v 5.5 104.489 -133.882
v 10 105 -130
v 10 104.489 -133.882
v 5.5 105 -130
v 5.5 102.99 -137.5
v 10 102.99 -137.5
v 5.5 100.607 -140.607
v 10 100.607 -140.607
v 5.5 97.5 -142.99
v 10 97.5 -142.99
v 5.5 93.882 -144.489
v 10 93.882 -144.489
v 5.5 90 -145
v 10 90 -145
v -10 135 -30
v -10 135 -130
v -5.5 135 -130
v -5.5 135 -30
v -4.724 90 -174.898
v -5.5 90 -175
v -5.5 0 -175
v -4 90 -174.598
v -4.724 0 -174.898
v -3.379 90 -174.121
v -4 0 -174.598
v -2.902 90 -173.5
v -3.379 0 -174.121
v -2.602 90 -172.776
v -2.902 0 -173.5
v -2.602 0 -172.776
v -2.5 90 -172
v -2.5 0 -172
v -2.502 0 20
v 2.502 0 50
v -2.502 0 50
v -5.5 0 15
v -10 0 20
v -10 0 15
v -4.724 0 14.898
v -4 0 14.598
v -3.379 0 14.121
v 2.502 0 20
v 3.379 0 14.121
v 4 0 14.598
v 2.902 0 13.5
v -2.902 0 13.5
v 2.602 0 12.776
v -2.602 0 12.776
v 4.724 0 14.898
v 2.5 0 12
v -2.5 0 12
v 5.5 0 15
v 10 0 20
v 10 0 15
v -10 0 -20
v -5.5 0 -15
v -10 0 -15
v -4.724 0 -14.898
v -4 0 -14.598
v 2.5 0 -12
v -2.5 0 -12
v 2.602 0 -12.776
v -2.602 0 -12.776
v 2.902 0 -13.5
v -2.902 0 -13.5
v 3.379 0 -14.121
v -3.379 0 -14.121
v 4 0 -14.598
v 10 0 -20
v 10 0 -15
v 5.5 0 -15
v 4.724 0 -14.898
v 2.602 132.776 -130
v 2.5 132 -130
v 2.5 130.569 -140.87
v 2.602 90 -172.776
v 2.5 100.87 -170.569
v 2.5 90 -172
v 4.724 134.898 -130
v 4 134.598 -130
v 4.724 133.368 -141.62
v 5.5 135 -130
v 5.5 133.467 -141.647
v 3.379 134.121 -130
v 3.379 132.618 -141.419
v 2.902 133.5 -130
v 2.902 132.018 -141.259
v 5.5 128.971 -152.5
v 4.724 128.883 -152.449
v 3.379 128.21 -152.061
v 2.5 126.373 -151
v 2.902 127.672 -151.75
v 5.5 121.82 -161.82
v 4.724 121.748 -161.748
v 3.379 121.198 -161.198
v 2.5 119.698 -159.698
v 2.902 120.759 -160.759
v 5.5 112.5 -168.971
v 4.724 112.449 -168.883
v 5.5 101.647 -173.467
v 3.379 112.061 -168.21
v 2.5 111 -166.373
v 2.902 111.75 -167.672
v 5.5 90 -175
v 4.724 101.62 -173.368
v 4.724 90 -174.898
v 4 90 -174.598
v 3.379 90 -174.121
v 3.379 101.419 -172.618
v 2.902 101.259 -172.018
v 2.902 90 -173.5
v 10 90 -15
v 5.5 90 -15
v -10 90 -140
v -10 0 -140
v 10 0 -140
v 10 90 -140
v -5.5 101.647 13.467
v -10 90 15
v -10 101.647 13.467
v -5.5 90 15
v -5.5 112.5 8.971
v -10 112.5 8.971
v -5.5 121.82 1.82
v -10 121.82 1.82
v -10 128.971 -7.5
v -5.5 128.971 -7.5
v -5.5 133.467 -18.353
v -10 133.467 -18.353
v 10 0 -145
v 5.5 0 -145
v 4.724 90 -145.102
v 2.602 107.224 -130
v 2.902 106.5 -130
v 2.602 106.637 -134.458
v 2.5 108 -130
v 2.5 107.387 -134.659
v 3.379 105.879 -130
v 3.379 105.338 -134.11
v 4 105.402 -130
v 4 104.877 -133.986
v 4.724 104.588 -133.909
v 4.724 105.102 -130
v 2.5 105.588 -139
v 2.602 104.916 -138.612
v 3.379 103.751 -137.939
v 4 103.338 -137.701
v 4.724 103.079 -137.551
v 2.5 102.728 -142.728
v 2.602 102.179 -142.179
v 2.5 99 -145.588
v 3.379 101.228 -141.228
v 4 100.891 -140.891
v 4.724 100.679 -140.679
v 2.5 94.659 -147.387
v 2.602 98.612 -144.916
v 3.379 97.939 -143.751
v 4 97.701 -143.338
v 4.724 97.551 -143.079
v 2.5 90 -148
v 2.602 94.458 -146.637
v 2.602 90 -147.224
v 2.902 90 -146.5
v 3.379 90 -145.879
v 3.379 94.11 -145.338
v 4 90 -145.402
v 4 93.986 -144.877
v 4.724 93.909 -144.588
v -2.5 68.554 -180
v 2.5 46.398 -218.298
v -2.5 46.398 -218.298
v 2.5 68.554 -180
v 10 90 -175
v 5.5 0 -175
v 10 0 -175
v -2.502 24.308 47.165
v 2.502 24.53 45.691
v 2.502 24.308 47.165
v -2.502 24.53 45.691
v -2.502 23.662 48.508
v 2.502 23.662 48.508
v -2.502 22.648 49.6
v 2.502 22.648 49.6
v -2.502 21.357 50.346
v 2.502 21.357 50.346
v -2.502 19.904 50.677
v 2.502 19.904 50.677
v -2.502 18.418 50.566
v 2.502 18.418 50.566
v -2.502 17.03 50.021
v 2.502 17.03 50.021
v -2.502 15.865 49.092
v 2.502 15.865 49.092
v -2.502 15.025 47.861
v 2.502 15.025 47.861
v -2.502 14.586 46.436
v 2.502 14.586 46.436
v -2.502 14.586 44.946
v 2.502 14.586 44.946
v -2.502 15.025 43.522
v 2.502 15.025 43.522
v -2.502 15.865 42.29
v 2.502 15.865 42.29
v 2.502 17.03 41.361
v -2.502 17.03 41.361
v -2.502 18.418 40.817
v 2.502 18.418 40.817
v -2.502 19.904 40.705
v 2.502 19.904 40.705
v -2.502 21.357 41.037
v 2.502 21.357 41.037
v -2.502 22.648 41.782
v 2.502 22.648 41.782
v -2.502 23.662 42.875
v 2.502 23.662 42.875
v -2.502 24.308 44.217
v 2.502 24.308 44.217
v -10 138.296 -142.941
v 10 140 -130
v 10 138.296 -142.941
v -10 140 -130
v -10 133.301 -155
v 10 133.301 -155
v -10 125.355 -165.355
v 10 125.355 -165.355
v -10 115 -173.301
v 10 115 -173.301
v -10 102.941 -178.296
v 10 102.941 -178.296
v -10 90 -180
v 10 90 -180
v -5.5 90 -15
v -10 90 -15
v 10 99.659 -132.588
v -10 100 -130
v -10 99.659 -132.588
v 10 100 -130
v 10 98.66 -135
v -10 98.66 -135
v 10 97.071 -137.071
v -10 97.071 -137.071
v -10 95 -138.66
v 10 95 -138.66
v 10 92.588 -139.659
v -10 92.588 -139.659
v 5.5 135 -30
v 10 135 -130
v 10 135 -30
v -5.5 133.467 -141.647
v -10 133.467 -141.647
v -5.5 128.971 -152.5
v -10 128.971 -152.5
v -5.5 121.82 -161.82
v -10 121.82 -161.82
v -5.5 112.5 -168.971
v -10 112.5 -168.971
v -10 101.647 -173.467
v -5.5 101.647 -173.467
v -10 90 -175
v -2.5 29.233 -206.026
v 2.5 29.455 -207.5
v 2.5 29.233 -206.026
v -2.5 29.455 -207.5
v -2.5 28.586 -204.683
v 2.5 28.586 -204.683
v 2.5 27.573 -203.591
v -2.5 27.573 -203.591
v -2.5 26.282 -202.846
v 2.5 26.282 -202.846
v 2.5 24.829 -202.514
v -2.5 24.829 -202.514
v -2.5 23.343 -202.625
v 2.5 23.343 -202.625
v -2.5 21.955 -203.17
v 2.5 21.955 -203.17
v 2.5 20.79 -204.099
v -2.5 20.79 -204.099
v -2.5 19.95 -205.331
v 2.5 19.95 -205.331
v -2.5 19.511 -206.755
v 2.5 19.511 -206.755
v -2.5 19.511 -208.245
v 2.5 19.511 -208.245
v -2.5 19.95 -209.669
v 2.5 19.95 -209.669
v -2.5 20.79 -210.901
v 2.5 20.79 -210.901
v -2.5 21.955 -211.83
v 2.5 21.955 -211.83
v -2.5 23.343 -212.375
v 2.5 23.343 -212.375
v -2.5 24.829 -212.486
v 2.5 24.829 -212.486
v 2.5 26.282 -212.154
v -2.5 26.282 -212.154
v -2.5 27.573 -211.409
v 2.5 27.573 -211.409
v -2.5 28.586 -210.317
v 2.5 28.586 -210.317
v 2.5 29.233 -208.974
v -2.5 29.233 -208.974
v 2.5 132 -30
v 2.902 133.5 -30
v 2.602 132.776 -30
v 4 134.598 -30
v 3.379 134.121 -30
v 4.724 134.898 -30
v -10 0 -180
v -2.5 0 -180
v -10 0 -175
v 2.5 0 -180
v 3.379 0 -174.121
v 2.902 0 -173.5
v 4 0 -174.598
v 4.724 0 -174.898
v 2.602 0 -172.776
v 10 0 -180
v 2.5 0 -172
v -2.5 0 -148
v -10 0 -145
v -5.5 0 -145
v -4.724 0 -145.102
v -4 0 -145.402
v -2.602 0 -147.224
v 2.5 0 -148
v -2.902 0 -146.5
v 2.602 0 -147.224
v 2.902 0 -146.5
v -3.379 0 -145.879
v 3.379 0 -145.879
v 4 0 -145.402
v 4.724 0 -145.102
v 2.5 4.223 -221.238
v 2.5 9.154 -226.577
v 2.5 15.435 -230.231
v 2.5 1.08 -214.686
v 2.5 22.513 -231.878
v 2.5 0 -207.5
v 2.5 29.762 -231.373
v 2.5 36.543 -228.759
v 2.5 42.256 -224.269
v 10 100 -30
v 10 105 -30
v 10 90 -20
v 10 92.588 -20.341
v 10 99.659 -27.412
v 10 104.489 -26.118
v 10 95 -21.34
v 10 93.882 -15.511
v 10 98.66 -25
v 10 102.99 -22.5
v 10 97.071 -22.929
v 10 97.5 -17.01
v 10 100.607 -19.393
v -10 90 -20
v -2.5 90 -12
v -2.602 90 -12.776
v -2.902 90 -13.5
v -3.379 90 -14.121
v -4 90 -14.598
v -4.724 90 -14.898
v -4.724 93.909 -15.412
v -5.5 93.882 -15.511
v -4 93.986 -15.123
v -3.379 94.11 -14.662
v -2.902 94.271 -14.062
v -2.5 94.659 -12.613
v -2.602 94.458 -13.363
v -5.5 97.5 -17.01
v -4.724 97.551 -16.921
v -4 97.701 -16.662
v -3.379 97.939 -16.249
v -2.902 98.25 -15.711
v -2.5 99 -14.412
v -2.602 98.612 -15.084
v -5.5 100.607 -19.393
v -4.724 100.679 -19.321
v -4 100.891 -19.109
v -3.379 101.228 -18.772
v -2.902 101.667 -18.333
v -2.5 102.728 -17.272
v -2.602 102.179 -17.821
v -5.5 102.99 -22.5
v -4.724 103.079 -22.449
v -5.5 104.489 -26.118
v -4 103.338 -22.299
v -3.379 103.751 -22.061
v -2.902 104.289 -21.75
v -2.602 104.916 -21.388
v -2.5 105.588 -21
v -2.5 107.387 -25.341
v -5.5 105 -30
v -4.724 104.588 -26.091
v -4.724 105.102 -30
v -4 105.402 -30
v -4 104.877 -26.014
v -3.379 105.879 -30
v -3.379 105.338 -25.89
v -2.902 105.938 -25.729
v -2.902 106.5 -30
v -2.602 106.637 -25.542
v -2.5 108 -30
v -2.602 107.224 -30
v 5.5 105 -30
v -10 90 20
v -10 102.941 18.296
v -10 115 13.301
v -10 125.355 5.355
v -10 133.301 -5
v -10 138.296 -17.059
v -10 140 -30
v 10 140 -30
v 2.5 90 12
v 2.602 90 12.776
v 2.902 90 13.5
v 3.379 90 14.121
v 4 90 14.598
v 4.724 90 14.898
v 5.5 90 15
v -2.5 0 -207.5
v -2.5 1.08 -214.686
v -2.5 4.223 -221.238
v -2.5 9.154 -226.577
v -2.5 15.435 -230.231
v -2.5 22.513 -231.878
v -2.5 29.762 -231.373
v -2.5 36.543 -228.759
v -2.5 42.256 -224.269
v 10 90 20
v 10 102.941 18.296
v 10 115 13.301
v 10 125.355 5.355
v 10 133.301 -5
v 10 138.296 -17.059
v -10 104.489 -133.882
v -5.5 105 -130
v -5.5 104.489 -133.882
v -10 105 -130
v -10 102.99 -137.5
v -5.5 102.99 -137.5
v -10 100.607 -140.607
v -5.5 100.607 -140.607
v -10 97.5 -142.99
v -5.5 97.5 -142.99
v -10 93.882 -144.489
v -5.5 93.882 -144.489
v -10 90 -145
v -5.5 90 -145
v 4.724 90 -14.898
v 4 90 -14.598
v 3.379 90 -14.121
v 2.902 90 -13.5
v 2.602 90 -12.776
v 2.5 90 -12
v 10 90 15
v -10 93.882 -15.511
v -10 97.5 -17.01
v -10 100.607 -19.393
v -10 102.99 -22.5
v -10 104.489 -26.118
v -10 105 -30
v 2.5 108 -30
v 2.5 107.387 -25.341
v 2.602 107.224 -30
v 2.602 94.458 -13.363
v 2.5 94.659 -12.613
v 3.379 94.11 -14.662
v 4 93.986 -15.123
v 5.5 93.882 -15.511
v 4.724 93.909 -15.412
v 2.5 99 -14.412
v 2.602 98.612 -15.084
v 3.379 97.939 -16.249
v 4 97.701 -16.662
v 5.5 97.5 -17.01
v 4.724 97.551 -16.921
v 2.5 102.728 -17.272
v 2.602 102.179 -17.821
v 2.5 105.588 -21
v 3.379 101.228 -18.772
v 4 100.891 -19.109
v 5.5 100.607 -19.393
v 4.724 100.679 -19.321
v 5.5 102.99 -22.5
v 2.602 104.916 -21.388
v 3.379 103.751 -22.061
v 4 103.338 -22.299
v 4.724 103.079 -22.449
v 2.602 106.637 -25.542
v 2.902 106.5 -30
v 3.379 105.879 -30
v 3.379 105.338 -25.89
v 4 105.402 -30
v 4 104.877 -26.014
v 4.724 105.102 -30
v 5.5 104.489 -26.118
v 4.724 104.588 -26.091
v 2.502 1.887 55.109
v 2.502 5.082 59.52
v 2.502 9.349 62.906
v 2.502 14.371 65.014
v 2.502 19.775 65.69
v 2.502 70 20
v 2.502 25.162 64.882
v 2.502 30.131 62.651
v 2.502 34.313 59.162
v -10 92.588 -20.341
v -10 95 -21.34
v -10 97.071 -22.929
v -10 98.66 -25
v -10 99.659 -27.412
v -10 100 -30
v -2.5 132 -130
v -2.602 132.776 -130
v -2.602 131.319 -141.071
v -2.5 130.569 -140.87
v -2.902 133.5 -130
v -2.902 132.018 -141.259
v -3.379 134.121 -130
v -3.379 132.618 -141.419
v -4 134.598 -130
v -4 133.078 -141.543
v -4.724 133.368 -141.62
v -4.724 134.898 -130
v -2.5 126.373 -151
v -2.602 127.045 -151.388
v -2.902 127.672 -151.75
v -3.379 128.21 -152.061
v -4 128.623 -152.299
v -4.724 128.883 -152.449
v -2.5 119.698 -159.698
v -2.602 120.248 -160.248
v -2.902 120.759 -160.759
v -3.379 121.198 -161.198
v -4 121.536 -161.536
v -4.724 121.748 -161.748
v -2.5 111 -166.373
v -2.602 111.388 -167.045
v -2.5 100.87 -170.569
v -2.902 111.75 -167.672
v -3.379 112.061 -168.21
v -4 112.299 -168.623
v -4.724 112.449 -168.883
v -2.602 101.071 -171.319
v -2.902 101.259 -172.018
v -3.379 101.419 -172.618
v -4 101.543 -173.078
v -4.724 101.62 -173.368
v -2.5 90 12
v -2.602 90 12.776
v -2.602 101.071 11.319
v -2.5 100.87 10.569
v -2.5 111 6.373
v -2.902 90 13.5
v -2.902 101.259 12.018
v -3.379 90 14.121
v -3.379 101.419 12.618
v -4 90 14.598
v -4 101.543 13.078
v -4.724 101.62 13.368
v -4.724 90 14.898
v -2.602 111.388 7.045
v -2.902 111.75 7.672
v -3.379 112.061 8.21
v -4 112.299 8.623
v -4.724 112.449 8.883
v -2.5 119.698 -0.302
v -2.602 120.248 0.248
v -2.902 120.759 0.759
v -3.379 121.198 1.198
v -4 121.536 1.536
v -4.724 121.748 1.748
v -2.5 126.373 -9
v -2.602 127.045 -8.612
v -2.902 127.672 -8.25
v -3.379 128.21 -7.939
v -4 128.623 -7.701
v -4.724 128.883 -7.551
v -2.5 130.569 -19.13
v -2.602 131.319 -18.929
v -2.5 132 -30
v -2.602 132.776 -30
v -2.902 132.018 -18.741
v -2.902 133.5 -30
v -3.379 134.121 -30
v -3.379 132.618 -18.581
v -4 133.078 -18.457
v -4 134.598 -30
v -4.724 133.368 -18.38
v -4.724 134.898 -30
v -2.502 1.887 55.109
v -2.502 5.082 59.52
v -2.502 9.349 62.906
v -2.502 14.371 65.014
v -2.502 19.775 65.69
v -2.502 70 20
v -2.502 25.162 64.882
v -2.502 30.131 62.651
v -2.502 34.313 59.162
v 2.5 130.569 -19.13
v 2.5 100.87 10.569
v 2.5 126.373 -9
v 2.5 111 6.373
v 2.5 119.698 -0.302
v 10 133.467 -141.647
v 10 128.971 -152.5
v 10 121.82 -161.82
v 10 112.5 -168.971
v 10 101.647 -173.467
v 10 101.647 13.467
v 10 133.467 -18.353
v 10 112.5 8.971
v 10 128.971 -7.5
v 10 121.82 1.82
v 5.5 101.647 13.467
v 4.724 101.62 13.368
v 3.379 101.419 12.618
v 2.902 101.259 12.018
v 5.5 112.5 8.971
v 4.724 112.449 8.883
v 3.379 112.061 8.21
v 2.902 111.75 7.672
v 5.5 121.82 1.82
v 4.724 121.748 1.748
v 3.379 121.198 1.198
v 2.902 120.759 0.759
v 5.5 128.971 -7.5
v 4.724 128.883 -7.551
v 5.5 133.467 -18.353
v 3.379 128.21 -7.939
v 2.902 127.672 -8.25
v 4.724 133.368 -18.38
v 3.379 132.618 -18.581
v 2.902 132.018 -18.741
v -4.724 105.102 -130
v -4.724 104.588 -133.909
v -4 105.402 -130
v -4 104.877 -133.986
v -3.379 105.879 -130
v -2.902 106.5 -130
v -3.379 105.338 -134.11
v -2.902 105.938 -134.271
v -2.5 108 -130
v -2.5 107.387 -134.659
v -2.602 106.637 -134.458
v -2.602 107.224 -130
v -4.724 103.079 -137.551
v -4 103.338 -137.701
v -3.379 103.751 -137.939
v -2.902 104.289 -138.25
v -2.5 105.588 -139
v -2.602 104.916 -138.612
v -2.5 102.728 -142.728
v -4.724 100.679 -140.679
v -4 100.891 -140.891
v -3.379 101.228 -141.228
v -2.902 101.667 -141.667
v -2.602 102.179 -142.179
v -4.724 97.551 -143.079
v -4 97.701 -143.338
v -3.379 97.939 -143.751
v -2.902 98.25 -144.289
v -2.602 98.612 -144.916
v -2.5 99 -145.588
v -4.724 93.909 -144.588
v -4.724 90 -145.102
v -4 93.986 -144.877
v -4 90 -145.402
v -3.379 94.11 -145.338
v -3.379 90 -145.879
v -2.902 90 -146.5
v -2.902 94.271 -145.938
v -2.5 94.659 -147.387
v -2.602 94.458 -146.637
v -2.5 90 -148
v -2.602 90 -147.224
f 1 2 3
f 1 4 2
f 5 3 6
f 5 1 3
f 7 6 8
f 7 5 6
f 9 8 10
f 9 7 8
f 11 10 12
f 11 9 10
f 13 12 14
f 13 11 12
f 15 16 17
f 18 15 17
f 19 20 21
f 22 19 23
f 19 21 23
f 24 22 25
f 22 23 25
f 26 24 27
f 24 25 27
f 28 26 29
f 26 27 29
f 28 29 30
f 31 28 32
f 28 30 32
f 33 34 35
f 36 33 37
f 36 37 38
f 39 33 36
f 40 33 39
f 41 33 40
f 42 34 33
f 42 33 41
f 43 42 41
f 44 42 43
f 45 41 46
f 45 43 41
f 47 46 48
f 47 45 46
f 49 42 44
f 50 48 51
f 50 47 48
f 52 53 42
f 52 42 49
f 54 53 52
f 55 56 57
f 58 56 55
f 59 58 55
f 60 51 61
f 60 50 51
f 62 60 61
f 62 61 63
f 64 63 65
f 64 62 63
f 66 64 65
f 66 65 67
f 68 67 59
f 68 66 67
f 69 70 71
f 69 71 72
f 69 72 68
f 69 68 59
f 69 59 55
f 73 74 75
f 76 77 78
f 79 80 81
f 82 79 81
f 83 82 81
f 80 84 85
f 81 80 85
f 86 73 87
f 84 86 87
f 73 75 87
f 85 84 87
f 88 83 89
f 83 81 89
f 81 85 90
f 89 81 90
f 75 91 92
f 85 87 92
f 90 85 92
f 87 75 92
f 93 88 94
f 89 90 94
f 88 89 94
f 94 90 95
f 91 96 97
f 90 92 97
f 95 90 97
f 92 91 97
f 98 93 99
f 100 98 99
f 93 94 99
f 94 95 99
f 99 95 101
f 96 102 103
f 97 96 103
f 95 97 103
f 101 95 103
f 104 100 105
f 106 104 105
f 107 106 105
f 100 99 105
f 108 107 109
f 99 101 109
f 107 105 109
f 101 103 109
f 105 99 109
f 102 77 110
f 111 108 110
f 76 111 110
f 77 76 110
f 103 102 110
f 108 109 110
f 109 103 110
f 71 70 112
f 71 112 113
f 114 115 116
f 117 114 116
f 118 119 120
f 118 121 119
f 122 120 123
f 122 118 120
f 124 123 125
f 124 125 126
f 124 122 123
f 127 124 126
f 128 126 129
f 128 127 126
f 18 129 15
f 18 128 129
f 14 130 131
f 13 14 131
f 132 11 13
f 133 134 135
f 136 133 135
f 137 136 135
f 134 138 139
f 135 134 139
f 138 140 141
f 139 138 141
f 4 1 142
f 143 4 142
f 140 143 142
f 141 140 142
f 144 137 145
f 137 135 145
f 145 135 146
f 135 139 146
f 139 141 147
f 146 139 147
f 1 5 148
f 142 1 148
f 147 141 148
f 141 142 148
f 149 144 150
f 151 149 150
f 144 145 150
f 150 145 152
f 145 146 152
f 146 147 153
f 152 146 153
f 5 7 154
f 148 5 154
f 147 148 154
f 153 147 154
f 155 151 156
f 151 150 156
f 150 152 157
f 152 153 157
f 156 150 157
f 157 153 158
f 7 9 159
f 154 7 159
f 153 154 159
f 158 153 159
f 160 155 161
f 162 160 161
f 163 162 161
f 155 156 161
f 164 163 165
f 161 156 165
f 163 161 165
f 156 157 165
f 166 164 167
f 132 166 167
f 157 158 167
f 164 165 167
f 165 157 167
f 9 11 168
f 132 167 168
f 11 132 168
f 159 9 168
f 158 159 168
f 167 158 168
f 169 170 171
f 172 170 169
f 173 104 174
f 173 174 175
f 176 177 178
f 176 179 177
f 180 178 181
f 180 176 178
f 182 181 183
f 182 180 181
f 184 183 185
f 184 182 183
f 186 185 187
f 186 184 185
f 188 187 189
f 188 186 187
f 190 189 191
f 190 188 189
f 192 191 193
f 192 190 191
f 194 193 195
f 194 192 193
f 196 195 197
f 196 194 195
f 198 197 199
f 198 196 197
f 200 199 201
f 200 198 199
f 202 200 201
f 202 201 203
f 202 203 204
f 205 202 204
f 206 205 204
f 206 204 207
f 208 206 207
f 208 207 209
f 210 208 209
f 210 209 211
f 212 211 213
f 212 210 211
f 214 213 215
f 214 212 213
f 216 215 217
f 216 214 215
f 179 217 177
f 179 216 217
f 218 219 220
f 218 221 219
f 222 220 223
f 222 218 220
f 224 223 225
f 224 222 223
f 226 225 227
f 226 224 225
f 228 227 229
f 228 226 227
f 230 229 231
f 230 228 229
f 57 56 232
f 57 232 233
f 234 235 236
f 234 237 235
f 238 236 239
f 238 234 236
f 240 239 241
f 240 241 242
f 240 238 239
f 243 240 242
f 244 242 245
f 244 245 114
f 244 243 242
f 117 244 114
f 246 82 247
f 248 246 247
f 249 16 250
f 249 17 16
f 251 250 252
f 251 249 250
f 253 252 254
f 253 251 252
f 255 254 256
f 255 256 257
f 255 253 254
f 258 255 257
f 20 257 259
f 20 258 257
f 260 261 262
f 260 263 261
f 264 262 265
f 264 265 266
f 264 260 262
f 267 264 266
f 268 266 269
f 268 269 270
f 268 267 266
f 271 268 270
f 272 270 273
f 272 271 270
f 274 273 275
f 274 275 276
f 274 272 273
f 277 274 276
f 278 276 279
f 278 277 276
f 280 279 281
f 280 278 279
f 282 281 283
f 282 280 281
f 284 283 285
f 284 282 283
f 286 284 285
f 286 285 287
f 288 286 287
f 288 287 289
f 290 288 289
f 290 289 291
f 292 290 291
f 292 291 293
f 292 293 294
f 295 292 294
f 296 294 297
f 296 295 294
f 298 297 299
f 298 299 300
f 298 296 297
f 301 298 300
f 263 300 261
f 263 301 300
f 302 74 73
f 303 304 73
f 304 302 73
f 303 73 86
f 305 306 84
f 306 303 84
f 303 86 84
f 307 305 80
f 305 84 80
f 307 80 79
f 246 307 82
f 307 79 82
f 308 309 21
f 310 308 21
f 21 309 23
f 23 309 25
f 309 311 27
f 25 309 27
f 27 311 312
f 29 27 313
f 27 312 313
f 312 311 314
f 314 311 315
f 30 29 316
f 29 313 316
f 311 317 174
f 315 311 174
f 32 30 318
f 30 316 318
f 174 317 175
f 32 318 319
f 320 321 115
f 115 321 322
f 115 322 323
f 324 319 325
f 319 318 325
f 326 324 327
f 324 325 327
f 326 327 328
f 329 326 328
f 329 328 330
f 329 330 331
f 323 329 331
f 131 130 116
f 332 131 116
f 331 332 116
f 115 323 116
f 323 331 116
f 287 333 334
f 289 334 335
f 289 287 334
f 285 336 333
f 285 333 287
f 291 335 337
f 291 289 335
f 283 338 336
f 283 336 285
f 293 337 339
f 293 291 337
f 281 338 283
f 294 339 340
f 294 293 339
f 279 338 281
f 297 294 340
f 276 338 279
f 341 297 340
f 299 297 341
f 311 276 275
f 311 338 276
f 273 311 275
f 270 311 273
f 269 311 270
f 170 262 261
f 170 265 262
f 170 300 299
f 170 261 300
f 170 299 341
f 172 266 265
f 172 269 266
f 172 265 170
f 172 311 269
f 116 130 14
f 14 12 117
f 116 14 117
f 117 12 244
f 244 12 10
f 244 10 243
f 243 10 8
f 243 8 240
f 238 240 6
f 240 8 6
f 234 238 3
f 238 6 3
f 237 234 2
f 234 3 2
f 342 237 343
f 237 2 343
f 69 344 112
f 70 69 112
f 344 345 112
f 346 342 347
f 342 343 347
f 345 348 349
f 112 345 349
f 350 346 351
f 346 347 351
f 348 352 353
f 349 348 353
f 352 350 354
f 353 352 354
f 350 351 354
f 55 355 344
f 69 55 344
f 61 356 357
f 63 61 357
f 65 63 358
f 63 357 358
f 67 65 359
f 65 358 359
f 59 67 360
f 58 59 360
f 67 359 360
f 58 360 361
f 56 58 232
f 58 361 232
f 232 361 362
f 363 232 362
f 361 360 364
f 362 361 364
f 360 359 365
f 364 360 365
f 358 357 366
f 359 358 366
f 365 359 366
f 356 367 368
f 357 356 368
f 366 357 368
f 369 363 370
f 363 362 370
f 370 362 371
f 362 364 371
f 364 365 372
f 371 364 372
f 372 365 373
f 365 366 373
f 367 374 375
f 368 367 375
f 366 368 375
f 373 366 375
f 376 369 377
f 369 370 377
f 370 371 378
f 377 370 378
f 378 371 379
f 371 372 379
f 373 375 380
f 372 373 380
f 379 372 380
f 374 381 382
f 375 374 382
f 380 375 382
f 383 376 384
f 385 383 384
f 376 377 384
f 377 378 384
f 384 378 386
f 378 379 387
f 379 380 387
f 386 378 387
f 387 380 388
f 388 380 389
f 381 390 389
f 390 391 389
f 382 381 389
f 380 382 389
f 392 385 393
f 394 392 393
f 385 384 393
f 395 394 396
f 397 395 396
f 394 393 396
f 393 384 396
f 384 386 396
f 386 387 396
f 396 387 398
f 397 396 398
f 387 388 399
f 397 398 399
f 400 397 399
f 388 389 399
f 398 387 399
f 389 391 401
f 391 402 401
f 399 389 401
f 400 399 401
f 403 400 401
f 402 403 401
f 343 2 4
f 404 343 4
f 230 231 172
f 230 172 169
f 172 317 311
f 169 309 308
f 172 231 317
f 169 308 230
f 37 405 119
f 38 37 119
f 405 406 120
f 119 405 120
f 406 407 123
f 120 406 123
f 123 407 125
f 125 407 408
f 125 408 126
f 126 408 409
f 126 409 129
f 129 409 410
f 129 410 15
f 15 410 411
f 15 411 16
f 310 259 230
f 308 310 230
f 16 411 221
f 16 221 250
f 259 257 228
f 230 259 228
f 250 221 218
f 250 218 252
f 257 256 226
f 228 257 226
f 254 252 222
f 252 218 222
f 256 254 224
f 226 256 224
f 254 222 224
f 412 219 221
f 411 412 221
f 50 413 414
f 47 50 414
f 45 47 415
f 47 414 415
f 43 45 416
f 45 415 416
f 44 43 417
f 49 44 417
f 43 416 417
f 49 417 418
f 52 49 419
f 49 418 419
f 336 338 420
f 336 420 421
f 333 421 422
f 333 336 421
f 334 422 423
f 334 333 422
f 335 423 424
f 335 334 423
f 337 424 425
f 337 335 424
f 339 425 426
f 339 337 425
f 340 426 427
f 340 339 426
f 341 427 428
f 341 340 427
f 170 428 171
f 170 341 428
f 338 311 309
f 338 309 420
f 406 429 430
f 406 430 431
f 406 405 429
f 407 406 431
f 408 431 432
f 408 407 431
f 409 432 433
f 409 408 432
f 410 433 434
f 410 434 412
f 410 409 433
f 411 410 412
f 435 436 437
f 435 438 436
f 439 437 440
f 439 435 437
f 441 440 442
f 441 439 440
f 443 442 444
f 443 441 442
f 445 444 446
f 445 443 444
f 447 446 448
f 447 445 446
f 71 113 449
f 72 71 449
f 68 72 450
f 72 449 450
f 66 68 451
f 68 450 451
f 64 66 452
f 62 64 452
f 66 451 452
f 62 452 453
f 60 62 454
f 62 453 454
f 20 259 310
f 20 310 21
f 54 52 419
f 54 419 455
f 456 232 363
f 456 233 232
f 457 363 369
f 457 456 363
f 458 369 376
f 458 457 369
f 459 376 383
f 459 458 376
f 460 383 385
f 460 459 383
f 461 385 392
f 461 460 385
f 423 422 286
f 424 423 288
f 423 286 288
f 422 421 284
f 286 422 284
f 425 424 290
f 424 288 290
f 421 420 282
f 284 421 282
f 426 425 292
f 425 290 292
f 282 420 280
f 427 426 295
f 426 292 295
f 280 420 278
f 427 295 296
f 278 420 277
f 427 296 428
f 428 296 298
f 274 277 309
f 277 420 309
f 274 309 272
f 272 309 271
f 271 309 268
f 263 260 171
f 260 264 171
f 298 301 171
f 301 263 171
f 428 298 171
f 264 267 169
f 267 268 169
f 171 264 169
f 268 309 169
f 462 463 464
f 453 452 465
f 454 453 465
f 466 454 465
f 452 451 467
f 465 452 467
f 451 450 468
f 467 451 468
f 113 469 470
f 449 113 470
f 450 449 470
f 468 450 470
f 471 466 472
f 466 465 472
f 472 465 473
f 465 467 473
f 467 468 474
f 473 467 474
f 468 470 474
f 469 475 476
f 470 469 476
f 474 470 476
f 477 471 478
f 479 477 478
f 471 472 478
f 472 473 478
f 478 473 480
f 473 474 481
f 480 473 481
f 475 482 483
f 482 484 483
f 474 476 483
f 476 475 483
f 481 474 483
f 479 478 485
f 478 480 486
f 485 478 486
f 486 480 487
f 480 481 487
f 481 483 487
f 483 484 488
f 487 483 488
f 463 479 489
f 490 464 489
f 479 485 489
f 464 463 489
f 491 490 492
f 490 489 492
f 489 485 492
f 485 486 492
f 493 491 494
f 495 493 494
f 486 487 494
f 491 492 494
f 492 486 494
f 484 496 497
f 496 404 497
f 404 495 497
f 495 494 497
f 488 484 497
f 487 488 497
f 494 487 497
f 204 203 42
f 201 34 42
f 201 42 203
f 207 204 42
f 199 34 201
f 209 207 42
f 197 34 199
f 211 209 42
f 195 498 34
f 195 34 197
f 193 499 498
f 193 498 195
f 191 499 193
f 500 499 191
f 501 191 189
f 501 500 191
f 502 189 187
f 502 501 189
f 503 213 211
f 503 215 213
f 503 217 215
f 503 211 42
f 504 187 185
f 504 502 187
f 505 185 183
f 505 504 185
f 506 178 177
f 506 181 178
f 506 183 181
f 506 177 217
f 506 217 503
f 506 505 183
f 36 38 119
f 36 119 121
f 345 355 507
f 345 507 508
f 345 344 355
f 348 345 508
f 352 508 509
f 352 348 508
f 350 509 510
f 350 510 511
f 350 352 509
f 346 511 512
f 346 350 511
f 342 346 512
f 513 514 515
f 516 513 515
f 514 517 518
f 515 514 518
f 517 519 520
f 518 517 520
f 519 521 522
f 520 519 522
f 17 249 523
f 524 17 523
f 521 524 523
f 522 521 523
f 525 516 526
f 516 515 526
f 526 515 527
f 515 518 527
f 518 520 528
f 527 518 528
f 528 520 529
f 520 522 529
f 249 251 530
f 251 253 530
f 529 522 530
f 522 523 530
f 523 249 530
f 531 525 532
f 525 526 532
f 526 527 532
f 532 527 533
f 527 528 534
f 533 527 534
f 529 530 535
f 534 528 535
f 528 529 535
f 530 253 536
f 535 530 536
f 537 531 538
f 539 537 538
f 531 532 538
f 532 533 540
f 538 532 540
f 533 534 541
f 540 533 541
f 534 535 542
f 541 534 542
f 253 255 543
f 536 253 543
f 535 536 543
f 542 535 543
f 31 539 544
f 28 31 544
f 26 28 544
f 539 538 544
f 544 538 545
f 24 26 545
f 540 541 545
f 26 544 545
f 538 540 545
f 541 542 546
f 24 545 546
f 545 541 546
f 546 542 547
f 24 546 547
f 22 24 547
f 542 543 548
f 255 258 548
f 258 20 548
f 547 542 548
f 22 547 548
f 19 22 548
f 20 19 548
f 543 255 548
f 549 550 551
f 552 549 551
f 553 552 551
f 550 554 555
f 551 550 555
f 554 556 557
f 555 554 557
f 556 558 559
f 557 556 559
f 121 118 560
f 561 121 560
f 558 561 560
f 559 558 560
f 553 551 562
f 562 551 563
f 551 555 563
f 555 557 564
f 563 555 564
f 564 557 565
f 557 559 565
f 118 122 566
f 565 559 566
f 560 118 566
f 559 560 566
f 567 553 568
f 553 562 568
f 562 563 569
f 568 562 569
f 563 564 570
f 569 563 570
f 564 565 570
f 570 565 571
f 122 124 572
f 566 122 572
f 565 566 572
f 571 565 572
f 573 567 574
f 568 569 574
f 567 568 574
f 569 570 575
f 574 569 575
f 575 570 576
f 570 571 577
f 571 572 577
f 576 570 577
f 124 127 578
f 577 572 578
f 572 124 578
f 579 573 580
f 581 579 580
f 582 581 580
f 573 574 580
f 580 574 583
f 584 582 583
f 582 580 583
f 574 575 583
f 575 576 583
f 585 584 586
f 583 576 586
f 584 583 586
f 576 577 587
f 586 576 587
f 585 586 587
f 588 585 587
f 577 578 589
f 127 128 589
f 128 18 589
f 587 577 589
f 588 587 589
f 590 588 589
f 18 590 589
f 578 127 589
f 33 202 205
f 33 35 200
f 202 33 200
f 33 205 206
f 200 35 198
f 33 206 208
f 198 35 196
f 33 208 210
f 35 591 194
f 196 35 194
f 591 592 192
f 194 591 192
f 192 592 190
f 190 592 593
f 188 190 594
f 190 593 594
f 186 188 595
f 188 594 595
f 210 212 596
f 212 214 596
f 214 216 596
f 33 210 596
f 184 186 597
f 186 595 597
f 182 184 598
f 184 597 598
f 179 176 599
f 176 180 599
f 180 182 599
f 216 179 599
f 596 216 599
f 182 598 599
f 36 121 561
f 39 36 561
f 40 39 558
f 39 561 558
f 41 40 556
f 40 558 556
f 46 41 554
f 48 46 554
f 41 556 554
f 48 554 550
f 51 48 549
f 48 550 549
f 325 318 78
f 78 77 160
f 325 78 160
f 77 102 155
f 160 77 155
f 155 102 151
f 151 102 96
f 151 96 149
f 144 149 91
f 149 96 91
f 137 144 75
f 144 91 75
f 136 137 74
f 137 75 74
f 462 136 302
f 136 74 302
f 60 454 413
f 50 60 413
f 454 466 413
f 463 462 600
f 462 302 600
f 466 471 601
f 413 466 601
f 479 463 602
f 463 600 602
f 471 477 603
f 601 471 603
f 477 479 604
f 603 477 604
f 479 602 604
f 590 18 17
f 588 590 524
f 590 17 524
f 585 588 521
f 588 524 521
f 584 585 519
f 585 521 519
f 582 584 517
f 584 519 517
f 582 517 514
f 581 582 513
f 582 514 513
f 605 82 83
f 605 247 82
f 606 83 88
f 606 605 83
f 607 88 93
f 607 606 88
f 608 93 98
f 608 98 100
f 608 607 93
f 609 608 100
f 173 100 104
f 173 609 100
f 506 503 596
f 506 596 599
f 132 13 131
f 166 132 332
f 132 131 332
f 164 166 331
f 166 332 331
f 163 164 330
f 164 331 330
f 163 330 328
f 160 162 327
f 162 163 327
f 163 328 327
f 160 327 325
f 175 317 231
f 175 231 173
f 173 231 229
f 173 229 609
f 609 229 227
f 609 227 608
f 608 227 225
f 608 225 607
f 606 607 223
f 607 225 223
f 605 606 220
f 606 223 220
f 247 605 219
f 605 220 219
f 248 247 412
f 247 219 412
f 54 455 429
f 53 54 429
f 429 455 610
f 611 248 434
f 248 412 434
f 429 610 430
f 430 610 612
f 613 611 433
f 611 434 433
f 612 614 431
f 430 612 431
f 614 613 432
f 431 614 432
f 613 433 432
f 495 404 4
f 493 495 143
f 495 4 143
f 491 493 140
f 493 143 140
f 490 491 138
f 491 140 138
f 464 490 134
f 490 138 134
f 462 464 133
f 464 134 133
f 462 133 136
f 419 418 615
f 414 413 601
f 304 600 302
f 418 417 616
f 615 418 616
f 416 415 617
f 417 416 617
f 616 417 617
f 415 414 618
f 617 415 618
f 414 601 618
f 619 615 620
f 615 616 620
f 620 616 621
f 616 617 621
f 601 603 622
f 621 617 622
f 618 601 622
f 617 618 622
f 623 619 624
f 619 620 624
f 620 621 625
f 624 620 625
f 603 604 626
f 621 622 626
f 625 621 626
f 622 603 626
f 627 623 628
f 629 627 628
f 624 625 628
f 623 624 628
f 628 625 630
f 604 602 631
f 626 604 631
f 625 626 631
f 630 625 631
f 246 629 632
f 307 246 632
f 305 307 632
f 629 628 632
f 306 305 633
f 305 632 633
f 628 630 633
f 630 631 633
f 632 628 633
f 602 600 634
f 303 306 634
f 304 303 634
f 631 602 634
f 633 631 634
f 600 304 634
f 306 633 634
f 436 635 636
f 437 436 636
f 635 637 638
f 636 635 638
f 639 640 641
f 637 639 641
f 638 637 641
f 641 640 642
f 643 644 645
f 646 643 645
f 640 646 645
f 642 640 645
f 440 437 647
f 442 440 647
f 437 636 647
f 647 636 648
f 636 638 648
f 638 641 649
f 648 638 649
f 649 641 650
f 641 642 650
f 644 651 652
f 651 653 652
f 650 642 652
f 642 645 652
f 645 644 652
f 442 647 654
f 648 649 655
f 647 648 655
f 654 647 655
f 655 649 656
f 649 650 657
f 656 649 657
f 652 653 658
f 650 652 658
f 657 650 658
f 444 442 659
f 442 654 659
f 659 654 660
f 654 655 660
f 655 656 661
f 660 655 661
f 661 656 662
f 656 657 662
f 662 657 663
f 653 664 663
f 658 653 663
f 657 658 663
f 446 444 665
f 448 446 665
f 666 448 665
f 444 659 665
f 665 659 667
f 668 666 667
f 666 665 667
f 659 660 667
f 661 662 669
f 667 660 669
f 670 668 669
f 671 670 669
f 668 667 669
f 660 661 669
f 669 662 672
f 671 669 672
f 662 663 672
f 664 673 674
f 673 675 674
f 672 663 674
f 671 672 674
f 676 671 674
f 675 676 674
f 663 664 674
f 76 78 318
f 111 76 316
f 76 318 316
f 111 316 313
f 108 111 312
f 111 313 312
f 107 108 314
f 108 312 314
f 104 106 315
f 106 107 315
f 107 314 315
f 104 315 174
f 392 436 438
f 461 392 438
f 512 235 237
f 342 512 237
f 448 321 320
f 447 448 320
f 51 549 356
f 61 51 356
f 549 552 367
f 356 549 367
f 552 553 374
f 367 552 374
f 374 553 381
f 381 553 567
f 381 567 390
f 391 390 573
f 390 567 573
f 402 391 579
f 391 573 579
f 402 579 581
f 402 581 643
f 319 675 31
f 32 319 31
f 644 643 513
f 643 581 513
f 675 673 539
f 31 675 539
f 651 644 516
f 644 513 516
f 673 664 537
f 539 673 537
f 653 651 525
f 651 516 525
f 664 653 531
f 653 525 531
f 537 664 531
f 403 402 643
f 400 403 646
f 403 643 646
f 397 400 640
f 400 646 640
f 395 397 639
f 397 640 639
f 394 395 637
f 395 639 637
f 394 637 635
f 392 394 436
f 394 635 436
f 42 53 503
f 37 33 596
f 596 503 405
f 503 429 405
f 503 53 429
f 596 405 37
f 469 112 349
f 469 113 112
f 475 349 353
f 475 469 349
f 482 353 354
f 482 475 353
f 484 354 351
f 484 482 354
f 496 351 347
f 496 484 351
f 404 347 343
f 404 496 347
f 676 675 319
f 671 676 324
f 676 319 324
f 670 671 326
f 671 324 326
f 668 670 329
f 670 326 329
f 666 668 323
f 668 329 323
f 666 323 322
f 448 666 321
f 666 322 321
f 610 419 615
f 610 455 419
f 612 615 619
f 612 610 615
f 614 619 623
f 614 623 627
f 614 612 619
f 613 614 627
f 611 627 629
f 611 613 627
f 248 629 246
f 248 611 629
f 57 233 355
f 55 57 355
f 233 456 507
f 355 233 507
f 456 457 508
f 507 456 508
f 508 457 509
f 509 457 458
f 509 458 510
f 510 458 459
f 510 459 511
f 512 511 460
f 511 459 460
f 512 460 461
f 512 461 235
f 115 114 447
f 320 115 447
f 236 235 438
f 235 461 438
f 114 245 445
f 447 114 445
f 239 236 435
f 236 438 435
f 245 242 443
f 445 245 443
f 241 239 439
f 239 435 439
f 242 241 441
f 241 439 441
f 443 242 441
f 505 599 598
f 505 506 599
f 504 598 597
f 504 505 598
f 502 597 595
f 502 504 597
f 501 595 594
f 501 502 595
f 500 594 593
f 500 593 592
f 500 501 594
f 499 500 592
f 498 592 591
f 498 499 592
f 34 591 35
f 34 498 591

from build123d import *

# Parameters (mm, degrees)
F3_R     = 5
F4_DEPTH = 2.5019
F5_R     = 5
F6_DEPTH = 2.5


with BuildPart() as f2:
    # F2: sweep along a path in F1
    with BuildLine(Plane.YZ) as f2_path:
        Line((0, -20), (90, -20))
        ThreePointArc((90, -20), (97.0710678119, -22.9289321881), (100, -30))
        Line((100, -30), (100, -70))
        Line((100, -70), (100, -130))
        ThreePointArc((100, -130), (97.0710678119, -137.0710678119), (90, -140))
        Line((90, -140), (0, -140))
    # F0 (on Front) → F2 (sweep)
    with BuildSketch(Plane.XZ):
        with BuildLine():
            Line((10, 20), (0, 20))
            Line((0, 20), (-10, 20))
            Line((-10, 20), (-10, 15))
            Line((-10, 15), (-5.5, 15))
            ThreePointArc((-5.5, 15), (-3.3786796564, 14.1213203436), (-2.5, 12))
            Line((-2.5, 12), (-2.5, 0))
            Line((-2.5, 0), (-2.5, -12))
            ThreePointArc((-2.5, -12), (-3.3786796564, -14.1213203436), (-5.5, -15))
            Line((-5.5, -15), (-10, -15))
            Line((-10, -15), (-10, -20))
            Line((-10, -20), (0, -20))
            Line((0, -20), (10, -20))
            Line((10, -20), (10, -15))
            Line((10, -15), (5.5, -15))
            ThreePointArc((5.5, -15), (3.3786796564, -14.1213203436), (2.5, -12))
            Line((2.5, -12), (2.5, 0))
            Line((2.5, 0), (2.5, 12))
            ThreePointArc((2.5, 12), (3.3786796564, 14.1213203436), (5.5, 15))
            Line((5.5, 15), (10, 15))
            Line((10, 15), (10, 20))
        make_face()
    sweep(path=f2_path.line)

    # F3 (on Right) → F4 (join, symmetric)
    with BuildSketch(Plane.YZ):
        with BuildLine():
            Line((0, 50), (0, 20))
            Line((0, 20), (70, 20))
            Line((70, 20), (34.3131745435, 59.1621407854))
            ThreePointArc((34.3131745435, 59.1621407854), (14.3707898227, 65.0141729122), (0, 50))
        make_face()
        with Locations((19.5303310126, 45.6911520637)):
            Circle(F3_R, mode=Mode.SUBTRACT)
    extrude(amount=F4_DEPTH, both=True)

    # F5 (on Right) → F6 (join, symmetric)
    with BuildSketch(Plane.YZ):
        with BuildLine():
            Line((70, -177.5), (0, -177.5))
            Line((0, -177.5), (0, -207.5))
            ThreePointArc((0, -207.5), (18.9121985963, -231.3187428985), (46.3976711035, -218.2975075473))
            Line((46.3976711035, -218.2975075473), (70, -177.5))
        make_face()
        with Locations((24.4552150904, -207.5)):
            Circle(F5_R, mode=Mode.SUBTRACT)
    extrude(amount=F6_DEPTH, both=True)


solid = f2.part
